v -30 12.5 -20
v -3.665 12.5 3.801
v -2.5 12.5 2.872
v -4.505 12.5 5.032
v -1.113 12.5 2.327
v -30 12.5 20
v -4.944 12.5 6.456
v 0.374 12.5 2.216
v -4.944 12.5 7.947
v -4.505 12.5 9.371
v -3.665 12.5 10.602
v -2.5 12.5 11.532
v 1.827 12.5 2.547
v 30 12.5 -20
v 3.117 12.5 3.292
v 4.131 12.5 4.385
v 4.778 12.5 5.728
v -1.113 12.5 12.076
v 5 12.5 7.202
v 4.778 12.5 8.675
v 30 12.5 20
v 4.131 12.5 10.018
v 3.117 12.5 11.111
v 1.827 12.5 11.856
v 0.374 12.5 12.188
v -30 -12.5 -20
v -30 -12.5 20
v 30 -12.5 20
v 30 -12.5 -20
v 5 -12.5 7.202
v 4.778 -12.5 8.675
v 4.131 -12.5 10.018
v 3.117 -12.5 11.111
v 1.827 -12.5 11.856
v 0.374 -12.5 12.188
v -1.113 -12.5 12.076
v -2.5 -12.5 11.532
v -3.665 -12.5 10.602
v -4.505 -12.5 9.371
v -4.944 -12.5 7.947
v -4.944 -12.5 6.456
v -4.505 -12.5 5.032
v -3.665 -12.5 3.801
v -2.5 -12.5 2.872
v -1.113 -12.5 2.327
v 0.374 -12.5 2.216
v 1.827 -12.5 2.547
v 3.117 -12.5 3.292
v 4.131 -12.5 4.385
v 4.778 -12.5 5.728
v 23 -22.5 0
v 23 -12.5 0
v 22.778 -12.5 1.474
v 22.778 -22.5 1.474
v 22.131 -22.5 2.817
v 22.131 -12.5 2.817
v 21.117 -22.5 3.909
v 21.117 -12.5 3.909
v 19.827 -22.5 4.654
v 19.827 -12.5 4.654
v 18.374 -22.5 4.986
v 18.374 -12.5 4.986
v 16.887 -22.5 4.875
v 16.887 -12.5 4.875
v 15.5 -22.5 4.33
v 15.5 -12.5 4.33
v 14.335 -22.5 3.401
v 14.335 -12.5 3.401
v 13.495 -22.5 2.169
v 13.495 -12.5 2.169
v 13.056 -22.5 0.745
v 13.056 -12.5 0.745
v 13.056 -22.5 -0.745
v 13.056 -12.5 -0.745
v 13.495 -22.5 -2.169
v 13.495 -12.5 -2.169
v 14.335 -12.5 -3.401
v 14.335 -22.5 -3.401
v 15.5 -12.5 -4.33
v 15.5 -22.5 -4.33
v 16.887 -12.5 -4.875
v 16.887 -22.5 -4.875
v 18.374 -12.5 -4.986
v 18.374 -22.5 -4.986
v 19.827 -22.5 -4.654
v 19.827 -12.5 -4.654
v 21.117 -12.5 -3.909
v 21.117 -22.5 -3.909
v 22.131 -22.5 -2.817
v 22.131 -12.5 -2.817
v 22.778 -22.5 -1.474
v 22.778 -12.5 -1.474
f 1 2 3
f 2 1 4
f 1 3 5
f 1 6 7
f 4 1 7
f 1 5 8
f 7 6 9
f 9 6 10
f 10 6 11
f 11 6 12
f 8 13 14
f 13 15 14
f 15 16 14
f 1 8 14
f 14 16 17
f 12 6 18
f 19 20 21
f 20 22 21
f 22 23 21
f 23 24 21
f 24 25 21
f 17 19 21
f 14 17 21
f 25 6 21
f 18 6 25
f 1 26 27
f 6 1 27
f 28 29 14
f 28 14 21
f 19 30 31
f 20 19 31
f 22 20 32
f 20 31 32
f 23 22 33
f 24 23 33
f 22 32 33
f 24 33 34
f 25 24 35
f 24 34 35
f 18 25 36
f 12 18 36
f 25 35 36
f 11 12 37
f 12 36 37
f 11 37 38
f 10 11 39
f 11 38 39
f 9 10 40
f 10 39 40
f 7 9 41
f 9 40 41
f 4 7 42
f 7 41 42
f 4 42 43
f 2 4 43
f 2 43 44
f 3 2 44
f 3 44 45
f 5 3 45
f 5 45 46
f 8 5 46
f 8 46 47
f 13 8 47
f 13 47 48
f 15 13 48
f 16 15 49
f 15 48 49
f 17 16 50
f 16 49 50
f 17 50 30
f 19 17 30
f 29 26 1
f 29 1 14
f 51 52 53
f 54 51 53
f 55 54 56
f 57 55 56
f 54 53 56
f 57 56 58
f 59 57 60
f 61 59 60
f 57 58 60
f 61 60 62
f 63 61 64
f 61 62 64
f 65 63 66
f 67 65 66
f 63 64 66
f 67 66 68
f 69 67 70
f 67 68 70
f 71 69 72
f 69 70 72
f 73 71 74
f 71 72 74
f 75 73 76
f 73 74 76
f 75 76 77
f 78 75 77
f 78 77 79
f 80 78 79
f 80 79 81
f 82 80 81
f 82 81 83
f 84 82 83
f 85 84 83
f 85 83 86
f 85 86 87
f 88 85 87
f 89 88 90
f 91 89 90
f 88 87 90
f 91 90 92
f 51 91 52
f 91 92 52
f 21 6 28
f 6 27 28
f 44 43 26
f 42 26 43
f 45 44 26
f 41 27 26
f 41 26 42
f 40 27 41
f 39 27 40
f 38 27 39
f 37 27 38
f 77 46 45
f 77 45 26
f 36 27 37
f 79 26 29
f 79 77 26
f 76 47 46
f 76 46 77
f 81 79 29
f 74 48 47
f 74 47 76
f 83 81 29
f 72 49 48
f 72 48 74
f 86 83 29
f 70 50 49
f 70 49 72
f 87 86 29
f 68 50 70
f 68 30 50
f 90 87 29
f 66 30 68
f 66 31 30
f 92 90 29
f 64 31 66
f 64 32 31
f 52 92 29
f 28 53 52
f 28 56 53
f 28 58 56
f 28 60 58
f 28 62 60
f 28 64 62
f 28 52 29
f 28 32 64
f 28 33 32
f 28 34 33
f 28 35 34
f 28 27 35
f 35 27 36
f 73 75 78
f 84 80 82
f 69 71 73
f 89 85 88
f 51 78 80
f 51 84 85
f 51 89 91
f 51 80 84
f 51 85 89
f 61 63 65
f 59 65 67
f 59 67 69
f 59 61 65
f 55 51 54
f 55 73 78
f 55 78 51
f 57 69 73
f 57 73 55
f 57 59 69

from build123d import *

# Parameters (mm, degrees)
F0_W     = 60
F0_H     = 40
F1_DEPTH = 12.5
F2_R     = 5
F3_DEPTH = 10
F4_R     = 5
F5_DEPTH = 25


# Not quite as in the source:
# - a feature names something its author has since deleted; it is built from what else it names


with BuildPart() as f1:
    # F0 (on Front) → F1 (new body, symmetric)
    with BuildSketch(Plane.XZ):
        Rectangle(F0_W, F0_H)
    extrude(amount=F1_DEPTH, both=True)

    # F2 (on face) → F3 (join)
    with BuildSketch(Plane.XZ.offset(12.5)):
        with Locations((18, 0)):
            Circle(F2_R)
    extrude(amount=F3_DEPTH)

    # F4 (on face) → F5 (cut)
    with BuildSketch(Plane.XZ.offset(12.5)):
        with Locations((0, 7.2016329505)):
            Circle(F4_R)
    extrude(amount=-F5_DEPTH, mode=Mode.SUBTRACT)


solid = f1.part
